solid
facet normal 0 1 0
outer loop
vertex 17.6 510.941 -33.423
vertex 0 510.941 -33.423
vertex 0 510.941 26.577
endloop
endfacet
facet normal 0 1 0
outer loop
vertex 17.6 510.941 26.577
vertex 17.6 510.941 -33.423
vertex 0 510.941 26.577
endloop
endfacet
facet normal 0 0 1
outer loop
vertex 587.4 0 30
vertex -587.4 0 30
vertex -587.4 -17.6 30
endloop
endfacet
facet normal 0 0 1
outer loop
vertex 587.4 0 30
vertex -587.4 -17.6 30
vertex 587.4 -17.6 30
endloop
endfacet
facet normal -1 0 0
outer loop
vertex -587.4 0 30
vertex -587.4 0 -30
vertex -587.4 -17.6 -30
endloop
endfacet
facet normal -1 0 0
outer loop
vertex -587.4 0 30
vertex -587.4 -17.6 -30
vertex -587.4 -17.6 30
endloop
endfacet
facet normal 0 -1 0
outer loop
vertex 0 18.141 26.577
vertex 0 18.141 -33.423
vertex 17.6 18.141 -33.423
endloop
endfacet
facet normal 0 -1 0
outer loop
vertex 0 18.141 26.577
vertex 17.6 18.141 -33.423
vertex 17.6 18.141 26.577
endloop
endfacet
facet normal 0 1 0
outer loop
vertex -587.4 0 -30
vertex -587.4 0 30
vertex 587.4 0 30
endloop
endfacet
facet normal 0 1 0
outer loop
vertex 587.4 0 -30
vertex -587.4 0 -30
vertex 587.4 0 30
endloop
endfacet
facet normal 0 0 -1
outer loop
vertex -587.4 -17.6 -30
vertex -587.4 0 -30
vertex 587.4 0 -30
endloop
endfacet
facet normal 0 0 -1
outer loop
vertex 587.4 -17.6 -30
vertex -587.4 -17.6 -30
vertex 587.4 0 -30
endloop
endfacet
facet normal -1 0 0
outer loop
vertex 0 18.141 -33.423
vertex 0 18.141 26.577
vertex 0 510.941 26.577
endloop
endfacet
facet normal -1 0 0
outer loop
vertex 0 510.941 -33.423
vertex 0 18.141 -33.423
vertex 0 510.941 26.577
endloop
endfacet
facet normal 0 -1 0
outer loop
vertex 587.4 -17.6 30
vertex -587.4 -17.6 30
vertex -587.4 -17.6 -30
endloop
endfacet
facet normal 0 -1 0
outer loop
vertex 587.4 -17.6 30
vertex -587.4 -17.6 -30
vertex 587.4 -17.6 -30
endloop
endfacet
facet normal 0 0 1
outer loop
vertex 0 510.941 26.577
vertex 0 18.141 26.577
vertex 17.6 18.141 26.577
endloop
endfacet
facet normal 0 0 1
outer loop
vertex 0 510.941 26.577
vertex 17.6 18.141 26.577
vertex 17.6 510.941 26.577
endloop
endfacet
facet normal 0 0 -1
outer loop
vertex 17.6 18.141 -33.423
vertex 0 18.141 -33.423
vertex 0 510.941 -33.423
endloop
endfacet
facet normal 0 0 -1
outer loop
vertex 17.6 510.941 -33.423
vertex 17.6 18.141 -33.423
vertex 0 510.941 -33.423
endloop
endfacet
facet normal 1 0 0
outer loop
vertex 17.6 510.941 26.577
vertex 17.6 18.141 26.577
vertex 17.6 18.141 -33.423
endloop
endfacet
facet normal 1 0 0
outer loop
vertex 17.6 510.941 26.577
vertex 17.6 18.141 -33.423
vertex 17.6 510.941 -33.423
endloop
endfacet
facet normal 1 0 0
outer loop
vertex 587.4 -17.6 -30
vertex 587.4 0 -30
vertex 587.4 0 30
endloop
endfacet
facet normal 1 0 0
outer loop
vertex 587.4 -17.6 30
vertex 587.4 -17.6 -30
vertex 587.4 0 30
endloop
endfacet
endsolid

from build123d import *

# Parameters (mm, degrees)
F1_W     = 1174.8
F1_H     = 60
F2_DEPTH = 17.6
F3_W     = 492.8
F3_H     = 60
F4_DEPTH = 17.6


with BuildPart() as f2:
    # F1 (on Front) → F2 (new body)
    with BuildSketch(Plane.XZ):
        Rectangle(F1_W, F1_H)
    extrude(amount=F2_DEPTH)


with BuildPart() as f4:
    # F3 (on Right) → F4 (new body)
    with BuildSketch(Plane.YZ):
        with Locations((264.5408008248, -3.4226291725)):
            Rectangle(F3_W, F3_H)
    extrude(amount=F4_DEPTH)


solid = Compound([f2.part, f4.part])
